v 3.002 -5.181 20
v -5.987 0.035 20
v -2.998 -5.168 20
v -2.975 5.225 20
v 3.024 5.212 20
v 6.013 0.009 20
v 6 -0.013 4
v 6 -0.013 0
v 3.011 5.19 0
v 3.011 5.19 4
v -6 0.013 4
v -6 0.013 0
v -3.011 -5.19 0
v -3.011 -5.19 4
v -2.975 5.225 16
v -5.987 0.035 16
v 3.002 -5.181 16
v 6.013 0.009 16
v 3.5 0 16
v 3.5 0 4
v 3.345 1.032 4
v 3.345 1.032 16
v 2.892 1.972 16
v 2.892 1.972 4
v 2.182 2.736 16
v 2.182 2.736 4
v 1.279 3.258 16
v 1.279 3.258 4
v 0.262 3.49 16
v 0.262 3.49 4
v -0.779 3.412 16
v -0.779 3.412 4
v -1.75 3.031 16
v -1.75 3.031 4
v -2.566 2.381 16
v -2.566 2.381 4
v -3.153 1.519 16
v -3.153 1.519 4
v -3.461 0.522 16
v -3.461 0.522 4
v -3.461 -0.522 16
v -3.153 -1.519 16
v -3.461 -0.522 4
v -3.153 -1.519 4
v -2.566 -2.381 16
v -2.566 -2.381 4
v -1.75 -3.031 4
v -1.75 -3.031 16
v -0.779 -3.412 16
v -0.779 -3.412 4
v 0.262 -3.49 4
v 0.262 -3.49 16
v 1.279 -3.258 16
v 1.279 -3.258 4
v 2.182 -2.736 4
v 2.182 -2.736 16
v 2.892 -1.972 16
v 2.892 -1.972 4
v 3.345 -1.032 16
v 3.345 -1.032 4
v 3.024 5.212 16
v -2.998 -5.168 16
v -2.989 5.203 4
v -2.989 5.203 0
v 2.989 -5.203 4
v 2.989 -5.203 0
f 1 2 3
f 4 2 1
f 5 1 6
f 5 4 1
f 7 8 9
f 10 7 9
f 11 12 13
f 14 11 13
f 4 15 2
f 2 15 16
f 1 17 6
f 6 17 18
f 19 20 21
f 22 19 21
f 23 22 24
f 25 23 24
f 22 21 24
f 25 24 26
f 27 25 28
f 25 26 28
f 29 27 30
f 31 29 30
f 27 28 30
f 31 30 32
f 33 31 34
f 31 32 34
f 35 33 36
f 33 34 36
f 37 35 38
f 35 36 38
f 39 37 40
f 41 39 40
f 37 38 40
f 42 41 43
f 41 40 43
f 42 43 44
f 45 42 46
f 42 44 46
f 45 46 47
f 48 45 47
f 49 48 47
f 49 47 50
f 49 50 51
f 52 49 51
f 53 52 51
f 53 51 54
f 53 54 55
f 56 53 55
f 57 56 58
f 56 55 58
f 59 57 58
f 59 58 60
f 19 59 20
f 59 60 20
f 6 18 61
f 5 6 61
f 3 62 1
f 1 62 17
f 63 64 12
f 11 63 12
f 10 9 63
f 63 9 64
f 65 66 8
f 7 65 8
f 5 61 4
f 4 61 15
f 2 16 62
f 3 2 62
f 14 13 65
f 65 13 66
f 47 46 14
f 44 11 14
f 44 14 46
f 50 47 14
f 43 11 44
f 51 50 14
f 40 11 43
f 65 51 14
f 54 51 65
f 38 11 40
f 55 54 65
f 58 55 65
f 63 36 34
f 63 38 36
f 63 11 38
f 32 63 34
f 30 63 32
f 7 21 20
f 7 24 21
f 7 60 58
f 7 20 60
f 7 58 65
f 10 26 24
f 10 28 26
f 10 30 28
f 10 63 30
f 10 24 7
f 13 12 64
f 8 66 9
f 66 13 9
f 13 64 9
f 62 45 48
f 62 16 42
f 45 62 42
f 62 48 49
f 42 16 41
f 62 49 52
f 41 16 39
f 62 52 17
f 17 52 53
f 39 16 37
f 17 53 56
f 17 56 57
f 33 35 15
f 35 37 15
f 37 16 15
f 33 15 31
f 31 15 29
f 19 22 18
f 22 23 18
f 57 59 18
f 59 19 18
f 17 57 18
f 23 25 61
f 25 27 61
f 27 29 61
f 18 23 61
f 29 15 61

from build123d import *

# Parameters (mm, degrees)
F1_DEPTH = 4
F2_R     = 3.5
F3_DEPTH = 12
F4_R     = 3.5
F5_DEPTH = 4


with BuildPart() as f1:
    # F0 (on Top) → F1 (new body)
    with BuildSketch(Plane.XY):
        Polygon((2.988754, -5.202629), (5.999986, -0.012978), (3.011232, 5.189651), (-2.988754, 5.202629), (-5.999986, 0.012978), (-3.011232, -5.189651), align=None)
    extrude(amount=F1_DEPTH)

    # F2 (on face) → F3 (join)
    with BuildSketch(Plane.XY.offset(4)):
        Circle(F2_R)
    extrude(amount=F3_DEPTH)

    # F4 (on face) → F5 (join)
    with BuildSketch(Plane.XY.offset(16)):
        Polygon((3.002019, -5.180605), (6.013252, 0.009046), (3.024498, 5.211675), (-2.975488, 5.224653), (-5.98672, 0.035002), (-2.997967, -5.167627), align=None)
        Circle(F4_R, mode=Mode.SUBTRACT)
        Circle(F4_R)
    extrude(amount=F5_DEPTH)


solid = f1.part
